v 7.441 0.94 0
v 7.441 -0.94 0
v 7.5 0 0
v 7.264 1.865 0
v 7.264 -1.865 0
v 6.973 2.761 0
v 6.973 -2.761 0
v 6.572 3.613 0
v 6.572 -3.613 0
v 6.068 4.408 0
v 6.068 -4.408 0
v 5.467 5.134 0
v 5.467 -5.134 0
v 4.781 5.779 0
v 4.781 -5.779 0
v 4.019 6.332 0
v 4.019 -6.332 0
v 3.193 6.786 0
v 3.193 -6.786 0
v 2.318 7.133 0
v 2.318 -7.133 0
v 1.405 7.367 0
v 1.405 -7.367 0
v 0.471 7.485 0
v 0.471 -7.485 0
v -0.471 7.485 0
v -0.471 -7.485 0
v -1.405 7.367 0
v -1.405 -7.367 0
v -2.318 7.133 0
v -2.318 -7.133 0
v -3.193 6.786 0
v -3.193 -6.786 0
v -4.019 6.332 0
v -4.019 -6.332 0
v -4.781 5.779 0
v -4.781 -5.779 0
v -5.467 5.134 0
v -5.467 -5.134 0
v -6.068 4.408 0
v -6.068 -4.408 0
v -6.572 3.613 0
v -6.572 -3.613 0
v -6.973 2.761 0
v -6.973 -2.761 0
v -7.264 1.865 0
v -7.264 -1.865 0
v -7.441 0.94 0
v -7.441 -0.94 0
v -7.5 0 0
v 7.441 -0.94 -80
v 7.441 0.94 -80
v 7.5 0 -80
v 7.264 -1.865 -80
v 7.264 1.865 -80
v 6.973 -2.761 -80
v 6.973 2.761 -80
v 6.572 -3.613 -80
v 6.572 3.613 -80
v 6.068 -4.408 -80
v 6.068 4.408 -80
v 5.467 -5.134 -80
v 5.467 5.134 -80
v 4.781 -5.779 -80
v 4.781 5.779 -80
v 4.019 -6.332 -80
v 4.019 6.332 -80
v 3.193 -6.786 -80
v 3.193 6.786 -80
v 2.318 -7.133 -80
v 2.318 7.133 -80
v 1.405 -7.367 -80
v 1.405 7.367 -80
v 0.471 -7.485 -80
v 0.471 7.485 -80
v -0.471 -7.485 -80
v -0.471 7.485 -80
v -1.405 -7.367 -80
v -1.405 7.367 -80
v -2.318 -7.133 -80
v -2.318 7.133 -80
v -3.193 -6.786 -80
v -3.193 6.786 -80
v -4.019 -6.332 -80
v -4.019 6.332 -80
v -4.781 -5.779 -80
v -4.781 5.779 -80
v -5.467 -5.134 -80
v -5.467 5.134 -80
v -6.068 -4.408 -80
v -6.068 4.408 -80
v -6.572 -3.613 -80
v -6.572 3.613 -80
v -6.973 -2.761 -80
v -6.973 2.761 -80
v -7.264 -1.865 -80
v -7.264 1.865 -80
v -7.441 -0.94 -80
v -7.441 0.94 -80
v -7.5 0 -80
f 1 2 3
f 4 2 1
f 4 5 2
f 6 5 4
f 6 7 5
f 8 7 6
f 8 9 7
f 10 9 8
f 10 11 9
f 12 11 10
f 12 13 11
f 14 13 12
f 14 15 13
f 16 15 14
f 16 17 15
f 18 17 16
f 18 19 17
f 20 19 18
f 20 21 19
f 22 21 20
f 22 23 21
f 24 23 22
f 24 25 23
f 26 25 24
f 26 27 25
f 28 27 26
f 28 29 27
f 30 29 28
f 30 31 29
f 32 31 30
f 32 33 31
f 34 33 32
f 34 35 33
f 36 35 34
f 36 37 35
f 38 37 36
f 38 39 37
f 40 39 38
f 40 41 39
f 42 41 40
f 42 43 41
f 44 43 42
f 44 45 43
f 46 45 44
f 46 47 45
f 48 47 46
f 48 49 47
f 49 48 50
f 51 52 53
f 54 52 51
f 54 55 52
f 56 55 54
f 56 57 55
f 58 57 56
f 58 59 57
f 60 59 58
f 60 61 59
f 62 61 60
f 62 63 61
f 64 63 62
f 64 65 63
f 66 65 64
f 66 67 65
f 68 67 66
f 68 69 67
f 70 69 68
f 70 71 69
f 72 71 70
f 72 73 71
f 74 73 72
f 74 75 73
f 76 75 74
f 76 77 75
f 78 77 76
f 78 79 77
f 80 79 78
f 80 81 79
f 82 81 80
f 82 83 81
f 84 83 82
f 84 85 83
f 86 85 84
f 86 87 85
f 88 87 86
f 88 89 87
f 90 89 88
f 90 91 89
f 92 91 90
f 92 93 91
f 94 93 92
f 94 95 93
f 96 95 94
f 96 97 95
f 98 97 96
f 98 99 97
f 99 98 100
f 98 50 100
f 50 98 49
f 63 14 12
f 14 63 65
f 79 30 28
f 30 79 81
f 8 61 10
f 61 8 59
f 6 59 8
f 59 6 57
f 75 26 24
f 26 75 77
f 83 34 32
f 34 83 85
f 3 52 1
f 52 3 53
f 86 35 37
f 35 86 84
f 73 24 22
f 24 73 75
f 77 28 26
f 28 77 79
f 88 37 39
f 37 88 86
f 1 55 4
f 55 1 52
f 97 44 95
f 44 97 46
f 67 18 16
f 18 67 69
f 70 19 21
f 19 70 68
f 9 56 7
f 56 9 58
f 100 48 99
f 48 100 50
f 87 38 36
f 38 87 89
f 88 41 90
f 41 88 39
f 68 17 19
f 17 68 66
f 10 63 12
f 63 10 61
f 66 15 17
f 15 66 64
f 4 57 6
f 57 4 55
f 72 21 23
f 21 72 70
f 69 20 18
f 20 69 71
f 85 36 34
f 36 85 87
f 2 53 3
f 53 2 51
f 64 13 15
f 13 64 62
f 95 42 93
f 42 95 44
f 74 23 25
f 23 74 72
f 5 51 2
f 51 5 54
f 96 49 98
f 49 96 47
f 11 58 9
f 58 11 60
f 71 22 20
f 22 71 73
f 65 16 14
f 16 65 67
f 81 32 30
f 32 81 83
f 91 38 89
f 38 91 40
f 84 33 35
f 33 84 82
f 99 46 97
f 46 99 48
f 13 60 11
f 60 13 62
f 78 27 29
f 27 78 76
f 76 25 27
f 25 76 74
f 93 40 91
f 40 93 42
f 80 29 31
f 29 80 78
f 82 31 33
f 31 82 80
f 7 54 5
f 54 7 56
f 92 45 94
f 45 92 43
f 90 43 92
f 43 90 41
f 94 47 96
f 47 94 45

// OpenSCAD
$fn = 50;


difference() {
	union() {
		translate(v = [0, 0, 0]) {
			rotate(a = [0, 0, 0]) {
				difference() {
					union() {
						#translate(v = [0, 0, -80.0000000000]) {
							cylinder(h = 80, r = 2.0000000000);
						}
						#translate(v = [0, 0, -80.0000000000]) {
							cylinder(h = 80, r = 2.2500000000);
						}
						#translate(v = [0, 0, -3.7000000000]) {
							cylinder(h = 3.7000000000, r = 7.5000000000, r1 = 2.0000000000, r2 = 5.4000000000);
						}
						#translate(v = [0, 0, -80.0000000000]) {
							cylinder(h = 80, r = 2.0000000000);
						}
					}
					union();
				}
			}
		}
		translate(v = [0, 0, -80.0000000000]) {
			cylinder(h = 80, r = 7.5000000000);
		}
	}
	union();
}
